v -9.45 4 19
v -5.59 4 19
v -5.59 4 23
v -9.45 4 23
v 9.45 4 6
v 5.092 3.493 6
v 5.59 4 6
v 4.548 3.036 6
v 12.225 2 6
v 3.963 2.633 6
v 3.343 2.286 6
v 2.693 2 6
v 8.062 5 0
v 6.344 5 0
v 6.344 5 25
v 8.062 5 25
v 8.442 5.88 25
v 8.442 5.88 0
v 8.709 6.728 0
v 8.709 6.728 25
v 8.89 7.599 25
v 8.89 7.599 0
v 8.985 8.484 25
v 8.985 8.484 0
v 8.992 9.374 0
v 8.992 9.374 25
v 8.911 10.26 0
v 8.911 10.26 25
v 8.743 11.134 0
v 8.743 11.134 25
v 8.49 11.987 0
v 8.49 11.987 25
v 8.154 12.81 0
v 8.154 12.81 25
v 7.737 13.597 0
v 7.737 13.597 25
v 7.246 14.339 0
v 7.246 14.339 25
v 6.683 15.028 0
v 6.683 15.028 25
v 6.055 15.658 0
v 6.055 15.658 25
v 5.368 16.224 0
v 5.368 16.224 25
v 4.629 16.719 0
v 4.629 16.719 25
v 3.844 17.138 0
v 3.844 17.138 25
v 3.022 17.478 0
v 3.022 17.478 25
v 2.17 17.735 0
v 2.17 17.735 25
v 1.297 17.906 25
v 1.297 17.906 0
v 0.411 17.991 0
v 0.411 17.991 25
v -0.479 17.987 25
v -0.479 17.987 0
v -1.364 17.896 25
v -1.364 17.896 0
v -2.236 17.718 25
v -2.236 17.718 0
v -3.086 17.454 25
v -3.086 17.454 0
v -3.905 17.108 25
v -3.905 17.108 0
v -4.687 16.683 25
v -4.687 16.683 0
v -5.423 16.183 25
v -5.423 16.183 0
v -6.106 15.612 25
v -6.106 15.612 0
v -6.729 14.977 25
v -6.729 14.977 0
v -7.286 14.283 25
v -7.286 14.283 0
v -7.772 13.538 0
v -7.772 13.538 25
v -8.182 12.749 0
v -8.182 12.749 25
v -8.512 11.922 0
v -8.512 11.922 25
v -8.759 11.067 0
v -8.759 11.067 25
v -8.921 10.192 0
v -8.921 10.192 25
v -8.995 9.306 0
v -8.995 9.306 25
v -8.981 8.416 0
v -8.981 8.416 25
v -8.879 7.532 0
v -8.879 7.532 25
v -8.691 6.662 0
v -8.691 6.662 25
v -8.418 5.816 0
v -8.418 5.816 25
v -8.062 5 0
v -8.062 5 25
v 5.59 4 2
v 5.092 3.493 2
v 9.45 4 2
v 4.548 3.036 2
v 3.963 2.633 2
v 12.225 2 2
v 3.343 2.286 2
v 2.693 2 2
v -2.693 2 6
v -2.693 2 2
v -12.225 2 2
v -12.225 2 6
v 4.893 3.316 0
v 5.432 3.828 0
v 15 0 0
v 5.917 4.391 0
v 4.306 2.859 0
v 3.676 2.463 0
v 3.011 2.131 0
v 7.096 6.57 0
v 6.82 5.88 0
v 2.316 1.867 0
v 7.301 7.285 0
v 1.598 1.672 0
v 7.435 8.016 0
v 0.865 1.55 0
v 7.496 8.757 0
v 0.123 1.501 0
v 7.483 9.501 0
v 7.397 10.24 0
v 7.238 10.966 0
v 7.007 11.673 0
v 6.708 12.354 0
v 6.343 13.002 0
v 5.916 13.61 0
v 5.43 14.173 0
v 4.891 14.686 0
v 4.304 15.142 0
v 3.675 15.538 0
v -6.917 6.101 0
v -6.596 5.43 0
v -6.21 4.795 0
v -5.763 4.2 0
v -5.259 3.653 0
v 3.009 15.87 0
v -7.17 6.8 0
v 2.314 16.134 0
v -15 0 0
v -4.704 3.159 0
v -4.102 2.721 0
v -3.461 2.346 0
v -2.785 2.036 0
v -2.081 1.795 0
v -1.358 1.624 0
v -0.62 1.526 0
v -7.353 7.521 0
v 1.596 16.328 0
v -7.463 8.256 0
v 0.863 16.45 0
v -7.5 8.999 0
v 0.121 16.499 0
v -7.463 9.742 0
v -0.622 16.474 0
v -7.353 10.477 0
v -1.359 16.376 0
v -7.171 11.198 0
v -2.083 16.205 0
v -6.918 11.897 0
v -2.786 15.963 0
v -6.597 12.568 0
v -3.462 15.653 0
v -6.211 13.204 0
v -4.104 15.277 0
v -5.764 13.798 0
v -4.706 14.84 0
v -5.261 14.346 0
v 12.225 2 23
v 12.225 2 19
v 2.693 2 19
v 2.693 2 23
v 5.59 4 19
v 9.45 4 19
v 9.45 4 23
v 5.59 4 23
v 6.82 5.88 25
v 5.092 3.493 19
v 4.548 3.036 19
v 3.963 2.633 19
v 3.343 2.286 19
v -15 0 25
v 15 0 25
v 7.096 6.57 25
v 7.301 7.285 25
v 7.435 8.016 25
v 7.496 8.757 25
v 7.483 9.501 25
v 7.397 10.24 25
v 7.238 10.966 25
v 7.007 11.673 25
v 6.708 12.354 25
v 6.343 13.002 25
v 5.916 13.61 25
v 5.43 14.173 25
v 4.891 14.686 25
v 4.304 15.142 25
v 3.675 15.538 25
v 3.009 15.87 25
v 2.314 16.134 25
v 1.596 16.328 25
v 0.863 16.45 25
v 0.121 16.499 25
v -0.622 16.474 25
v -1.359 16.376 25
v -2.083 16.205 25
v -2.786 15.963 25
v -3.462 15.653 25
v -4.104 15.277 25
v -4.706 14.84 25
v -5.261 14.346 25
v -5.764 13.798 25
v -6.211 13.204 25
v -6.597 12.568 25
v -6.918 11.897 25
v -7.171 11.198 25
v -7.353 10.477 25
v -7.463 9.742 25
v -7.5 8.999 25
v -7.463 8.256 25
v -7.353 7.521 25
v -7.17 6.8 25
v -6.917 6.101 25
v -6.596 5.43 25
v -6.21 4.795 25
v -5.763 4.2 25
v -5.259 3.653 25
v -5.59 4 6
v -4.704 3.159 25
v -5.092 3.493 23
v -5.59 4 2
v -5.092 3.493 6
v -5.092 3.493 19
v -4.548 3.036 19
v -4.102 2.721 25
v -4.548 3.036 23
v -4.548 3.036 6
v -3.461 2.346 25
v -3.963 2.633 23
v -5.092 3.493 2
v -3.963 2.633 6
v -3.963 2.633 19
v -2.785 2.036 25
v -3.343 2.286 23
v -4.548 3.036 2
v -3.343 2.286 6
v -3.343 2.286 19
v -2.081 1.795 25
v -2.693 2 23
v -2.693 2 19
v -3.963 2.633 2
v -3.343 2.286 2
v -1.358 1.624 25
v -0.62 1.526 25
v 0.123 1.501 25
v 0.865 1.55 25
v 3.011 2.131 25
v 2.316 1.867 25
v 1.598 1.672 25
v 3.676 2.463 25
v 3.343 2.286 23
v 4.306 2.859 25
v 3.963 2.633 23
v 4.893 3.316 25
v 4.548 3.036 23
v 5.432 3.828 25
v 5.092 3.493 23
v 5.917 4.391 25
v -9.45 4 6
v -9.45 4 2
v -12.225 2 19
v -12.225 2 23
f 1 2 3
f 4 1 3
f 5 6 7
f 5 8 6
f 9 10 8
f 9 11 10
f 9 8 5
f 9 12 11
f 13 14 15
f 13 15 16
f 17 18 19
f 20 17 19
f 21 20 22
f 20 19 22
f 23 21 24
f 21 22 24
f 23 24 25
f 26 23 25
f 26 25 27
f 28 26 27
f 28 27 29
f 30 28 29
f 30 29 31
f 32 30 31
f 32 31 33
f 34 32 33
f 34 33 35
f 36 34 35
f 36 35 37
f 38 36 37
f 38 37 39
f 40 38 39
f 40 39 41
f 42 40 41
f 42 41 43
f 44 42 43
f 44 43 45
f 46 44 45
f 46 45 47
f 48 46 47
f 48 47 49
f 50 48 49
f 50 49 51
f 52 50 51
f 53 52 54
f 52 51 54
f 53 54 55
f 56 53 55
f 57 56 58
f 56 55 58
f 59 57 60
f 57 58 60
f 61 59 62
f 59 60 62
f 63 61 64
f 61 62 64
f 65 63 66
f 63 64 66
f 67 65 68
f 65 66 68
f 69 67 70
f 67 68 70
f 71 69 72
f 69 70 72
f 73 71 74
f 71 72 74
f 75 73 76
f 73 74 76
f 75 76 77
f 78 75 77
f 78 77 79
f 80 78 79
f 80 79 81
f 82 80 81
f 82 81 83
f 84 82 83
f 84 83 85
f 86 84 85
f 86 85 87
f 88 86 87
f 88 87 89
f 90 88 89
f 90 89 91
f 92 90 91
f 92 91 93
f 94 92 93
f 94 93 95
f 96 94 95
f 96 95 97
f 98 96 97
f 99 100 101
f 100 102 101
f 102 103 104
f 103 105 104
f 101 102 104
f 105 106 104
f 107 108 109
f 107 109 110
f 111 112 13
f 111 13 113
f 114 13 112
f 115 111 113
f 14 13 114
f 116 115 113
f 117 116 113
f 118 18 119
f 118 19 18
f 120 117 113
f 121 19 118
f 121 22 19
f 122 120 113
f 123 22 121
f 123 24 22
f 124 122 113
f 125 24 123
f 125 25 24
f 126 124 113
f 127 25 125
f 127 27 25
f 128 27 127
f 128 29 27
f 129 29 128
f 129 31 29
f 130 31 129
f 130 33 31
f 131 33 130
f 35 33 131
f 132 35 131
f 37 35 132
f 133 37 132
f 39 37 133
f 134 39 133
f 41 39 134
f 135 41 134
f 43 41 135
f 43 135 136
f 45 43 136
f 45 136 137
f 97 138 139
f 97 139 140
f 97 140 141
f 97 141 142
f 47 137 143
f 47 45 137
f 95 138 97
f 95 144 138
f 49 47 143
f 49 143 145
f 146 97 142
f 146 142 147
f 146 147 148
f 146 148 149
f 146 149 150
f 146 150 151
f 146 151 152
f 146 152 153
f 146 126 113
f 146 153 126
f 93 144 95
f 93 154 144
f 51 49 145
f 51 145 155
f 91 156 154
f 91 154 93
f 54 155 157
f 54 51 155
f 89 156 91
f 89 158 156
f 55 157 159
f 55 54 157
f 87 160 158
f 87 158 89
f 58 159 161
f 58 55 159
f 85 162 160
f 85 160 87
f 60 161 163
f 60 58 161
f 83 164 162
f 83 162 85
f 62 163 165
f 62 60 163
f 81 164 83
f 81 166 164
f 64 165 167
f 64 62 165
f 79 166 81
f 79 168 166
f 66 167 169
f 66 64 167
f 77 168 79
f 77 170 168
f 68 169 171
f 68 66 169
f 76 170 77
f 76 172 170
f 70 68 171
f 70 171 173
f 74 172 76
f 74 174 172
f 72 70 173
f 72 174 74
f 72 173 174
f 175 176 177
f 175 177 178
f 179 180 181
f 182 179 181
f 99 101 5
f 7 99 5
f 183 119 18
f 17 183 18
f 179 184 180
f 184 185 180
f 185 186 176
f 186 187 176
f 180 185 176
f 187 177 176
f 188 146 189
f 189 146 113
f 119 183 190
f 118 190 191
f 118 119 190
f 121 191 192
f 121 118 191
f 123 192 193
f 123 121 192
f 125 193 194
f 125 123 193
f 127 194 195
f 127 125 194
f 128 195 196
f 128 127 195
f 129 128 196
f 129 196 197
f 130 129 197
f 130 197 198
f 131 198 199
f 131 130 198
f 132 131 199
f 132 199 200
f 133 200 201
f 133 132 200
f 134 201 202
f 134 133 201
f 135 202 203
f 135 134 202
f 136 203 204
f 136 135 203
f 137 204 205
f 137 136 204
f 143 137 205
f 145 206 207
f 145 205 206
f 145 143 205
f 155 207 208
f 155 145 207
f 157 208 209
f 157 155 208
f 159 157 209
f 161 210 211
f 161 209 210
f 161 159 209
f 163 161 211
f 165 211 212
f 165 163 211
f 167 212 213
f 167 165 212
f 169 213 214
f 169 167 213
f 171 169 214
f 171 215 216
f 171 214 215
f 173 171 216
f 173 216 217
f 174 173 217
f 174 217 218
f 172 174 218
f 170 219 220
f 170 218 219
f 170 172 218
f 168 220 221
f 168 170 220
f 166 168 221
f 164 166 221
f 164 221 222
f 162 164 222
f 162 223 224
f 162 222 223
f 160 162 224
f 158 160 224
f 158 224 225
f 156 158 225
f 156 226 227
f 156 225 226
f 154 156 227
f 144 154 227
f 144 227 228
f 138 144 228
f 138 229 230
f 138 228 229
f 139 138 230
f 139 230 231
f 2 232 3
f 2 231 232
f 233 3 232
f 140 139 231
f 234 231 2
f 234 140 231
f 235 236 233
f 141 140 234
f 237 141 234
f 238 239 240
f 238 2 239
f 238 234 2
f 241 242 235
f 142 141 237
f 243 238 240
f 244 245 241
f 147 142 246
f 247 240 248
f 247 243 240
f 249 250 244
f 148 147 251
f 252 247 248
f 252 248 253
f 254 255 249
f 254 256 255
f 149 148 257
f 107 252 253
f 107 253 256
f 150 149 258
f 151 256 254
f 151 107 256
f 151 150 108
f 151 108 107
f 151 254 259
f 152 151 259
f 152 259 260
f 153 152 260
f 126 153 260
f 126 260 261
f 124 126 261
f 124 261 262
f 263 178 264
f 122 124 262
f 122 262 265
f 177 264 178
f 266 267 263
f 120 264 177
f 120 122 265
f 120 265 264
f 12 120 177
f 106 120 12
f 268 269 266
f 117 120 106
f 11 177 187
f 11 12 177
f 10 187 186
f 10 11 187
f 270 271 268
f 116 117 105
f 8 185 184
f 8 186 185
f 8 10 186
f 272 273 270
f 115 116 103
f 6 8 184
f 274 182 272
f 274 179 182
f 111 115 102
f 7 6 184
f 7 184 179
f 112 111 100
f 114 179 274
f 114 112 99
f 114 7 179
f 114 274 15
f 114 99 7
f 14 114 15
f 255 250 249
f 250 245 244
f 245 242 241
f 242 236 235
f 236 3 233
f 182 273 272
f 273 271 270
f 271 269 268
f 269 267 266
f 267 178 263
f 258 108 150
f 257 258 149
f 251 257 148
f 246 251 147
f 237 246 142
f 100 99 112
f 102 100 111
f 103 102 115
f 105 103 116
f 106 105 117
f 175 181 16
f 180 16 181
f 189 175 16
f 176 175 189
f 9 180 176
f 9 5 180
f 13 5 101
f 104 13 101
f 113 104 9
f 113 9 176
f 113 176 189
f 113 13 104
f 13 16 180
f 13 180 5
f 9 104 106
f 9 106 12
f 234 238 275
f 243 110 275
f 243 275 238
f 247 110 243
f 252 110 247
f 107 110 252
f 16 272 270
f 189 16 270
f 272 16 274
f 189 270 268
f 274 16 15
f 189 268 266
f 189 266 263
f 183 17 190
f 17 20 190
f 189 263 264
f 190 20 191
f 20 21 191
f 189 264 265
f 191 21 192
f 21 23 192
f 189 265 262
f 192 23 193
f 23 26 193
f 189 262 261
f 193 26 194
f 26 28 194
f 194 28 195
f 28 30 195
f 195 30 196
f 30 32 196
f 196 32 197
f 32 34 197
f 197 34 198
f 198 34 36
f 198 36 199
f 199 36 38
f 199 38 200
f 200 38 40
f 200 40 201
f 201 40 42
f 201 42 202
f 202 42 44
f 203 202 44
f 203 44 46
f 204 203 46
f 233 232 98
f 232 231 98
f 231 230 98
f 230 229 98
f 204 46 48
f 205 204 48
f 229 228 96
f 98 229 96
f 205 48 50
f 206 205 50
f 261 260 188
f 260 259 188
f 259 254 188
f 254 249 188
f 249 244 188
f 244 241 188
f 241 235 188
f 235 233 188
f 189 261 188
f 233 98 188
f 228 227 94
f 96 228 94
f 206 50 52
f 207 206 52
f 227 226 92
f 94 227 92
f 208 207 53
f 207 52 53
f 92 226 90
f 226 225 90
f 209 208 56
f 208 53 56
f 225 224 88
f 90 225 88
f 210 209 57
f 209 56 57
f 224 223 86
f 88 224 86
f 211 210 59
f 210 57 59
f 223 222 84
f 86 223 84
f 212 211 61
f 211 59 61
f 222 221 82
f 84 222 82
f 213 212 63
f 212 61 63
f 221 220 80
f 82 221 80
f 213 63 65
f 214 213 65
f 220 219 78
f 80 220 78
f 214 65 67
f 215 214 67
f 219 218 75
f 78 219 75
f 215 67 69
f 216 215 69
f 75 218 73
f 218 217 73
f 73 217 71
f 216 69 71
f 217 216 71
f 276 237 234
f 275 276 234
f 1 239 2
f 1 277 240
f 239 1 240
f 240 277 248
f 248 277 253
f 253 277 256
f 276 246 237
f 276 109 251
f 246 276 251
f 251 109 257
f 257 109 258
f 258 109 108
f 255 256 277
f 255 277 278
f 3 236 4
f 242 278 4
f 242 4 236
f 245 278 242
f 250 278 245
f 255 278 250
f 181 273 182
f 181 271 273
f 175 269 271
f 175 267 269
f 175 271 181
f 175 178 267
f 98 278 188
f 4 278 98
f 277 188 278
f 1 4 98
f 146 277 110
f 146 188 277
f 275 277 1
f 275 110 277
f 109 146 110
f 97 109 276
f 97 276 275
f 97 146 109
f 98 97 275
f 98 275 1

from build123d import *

# Parameters (mm, degrees)
PAD_DEPTH       = 25
POCKET_DEPTH    = 25.001
SKETCH002_W     = 2
SKETCH002_H     = 4
POCKET001_DEPTH = 65.001


with BuildPart() as part:
    # Sketch → Pad (new body)
    with BuildSketch(Plane.XY):
        with BuildLine():
            Line((-15, 0), (-8.062258, 5))
            ThreePointArc((8.062258, 5), (0, 18), (-8.062258, 5))
            Line((8.062258, 5), (15, 0))
            Line((-15, 0), (15, 0))
        make_face()
    extrude(amount=PAD_DEPTH)

    # Sketch001 → Pocket (cut, through all)
    with BuildSketch(Plane.XY):
        with BuildLine():
            ThreePointArc((6.820042, 5.879579), (-6.596841, 12.568149), (6.344289, 5))
            Line((6.344289, 5), (8.062258, 5))
            ThreePointArc((8.062258, 5), (8.26371, 5.434737), (8.44174, 5.879579))
            Line((6.820042, 5.879579), (8.44174, 5.879579))
        make_face()
    extrude(amount=POCKET_DEPTH, mode=Mode.SUBTRACT)

    # Sketch002 → Pocket001 (cut, through all)
    with BuildSketch(Plane.YZ.offset(50)):
        with Locations((3, 21)):
            Rectangle(SKETCH002_W, SKETCH002_H)
        with Locations((3, 4)):
            Rectangle(SKETCH002_W, SKETCH002_H)
    extrude(amount=-POCKET001_DEPTH, mode=Mode.SUBTRACT)


solid = part.part
